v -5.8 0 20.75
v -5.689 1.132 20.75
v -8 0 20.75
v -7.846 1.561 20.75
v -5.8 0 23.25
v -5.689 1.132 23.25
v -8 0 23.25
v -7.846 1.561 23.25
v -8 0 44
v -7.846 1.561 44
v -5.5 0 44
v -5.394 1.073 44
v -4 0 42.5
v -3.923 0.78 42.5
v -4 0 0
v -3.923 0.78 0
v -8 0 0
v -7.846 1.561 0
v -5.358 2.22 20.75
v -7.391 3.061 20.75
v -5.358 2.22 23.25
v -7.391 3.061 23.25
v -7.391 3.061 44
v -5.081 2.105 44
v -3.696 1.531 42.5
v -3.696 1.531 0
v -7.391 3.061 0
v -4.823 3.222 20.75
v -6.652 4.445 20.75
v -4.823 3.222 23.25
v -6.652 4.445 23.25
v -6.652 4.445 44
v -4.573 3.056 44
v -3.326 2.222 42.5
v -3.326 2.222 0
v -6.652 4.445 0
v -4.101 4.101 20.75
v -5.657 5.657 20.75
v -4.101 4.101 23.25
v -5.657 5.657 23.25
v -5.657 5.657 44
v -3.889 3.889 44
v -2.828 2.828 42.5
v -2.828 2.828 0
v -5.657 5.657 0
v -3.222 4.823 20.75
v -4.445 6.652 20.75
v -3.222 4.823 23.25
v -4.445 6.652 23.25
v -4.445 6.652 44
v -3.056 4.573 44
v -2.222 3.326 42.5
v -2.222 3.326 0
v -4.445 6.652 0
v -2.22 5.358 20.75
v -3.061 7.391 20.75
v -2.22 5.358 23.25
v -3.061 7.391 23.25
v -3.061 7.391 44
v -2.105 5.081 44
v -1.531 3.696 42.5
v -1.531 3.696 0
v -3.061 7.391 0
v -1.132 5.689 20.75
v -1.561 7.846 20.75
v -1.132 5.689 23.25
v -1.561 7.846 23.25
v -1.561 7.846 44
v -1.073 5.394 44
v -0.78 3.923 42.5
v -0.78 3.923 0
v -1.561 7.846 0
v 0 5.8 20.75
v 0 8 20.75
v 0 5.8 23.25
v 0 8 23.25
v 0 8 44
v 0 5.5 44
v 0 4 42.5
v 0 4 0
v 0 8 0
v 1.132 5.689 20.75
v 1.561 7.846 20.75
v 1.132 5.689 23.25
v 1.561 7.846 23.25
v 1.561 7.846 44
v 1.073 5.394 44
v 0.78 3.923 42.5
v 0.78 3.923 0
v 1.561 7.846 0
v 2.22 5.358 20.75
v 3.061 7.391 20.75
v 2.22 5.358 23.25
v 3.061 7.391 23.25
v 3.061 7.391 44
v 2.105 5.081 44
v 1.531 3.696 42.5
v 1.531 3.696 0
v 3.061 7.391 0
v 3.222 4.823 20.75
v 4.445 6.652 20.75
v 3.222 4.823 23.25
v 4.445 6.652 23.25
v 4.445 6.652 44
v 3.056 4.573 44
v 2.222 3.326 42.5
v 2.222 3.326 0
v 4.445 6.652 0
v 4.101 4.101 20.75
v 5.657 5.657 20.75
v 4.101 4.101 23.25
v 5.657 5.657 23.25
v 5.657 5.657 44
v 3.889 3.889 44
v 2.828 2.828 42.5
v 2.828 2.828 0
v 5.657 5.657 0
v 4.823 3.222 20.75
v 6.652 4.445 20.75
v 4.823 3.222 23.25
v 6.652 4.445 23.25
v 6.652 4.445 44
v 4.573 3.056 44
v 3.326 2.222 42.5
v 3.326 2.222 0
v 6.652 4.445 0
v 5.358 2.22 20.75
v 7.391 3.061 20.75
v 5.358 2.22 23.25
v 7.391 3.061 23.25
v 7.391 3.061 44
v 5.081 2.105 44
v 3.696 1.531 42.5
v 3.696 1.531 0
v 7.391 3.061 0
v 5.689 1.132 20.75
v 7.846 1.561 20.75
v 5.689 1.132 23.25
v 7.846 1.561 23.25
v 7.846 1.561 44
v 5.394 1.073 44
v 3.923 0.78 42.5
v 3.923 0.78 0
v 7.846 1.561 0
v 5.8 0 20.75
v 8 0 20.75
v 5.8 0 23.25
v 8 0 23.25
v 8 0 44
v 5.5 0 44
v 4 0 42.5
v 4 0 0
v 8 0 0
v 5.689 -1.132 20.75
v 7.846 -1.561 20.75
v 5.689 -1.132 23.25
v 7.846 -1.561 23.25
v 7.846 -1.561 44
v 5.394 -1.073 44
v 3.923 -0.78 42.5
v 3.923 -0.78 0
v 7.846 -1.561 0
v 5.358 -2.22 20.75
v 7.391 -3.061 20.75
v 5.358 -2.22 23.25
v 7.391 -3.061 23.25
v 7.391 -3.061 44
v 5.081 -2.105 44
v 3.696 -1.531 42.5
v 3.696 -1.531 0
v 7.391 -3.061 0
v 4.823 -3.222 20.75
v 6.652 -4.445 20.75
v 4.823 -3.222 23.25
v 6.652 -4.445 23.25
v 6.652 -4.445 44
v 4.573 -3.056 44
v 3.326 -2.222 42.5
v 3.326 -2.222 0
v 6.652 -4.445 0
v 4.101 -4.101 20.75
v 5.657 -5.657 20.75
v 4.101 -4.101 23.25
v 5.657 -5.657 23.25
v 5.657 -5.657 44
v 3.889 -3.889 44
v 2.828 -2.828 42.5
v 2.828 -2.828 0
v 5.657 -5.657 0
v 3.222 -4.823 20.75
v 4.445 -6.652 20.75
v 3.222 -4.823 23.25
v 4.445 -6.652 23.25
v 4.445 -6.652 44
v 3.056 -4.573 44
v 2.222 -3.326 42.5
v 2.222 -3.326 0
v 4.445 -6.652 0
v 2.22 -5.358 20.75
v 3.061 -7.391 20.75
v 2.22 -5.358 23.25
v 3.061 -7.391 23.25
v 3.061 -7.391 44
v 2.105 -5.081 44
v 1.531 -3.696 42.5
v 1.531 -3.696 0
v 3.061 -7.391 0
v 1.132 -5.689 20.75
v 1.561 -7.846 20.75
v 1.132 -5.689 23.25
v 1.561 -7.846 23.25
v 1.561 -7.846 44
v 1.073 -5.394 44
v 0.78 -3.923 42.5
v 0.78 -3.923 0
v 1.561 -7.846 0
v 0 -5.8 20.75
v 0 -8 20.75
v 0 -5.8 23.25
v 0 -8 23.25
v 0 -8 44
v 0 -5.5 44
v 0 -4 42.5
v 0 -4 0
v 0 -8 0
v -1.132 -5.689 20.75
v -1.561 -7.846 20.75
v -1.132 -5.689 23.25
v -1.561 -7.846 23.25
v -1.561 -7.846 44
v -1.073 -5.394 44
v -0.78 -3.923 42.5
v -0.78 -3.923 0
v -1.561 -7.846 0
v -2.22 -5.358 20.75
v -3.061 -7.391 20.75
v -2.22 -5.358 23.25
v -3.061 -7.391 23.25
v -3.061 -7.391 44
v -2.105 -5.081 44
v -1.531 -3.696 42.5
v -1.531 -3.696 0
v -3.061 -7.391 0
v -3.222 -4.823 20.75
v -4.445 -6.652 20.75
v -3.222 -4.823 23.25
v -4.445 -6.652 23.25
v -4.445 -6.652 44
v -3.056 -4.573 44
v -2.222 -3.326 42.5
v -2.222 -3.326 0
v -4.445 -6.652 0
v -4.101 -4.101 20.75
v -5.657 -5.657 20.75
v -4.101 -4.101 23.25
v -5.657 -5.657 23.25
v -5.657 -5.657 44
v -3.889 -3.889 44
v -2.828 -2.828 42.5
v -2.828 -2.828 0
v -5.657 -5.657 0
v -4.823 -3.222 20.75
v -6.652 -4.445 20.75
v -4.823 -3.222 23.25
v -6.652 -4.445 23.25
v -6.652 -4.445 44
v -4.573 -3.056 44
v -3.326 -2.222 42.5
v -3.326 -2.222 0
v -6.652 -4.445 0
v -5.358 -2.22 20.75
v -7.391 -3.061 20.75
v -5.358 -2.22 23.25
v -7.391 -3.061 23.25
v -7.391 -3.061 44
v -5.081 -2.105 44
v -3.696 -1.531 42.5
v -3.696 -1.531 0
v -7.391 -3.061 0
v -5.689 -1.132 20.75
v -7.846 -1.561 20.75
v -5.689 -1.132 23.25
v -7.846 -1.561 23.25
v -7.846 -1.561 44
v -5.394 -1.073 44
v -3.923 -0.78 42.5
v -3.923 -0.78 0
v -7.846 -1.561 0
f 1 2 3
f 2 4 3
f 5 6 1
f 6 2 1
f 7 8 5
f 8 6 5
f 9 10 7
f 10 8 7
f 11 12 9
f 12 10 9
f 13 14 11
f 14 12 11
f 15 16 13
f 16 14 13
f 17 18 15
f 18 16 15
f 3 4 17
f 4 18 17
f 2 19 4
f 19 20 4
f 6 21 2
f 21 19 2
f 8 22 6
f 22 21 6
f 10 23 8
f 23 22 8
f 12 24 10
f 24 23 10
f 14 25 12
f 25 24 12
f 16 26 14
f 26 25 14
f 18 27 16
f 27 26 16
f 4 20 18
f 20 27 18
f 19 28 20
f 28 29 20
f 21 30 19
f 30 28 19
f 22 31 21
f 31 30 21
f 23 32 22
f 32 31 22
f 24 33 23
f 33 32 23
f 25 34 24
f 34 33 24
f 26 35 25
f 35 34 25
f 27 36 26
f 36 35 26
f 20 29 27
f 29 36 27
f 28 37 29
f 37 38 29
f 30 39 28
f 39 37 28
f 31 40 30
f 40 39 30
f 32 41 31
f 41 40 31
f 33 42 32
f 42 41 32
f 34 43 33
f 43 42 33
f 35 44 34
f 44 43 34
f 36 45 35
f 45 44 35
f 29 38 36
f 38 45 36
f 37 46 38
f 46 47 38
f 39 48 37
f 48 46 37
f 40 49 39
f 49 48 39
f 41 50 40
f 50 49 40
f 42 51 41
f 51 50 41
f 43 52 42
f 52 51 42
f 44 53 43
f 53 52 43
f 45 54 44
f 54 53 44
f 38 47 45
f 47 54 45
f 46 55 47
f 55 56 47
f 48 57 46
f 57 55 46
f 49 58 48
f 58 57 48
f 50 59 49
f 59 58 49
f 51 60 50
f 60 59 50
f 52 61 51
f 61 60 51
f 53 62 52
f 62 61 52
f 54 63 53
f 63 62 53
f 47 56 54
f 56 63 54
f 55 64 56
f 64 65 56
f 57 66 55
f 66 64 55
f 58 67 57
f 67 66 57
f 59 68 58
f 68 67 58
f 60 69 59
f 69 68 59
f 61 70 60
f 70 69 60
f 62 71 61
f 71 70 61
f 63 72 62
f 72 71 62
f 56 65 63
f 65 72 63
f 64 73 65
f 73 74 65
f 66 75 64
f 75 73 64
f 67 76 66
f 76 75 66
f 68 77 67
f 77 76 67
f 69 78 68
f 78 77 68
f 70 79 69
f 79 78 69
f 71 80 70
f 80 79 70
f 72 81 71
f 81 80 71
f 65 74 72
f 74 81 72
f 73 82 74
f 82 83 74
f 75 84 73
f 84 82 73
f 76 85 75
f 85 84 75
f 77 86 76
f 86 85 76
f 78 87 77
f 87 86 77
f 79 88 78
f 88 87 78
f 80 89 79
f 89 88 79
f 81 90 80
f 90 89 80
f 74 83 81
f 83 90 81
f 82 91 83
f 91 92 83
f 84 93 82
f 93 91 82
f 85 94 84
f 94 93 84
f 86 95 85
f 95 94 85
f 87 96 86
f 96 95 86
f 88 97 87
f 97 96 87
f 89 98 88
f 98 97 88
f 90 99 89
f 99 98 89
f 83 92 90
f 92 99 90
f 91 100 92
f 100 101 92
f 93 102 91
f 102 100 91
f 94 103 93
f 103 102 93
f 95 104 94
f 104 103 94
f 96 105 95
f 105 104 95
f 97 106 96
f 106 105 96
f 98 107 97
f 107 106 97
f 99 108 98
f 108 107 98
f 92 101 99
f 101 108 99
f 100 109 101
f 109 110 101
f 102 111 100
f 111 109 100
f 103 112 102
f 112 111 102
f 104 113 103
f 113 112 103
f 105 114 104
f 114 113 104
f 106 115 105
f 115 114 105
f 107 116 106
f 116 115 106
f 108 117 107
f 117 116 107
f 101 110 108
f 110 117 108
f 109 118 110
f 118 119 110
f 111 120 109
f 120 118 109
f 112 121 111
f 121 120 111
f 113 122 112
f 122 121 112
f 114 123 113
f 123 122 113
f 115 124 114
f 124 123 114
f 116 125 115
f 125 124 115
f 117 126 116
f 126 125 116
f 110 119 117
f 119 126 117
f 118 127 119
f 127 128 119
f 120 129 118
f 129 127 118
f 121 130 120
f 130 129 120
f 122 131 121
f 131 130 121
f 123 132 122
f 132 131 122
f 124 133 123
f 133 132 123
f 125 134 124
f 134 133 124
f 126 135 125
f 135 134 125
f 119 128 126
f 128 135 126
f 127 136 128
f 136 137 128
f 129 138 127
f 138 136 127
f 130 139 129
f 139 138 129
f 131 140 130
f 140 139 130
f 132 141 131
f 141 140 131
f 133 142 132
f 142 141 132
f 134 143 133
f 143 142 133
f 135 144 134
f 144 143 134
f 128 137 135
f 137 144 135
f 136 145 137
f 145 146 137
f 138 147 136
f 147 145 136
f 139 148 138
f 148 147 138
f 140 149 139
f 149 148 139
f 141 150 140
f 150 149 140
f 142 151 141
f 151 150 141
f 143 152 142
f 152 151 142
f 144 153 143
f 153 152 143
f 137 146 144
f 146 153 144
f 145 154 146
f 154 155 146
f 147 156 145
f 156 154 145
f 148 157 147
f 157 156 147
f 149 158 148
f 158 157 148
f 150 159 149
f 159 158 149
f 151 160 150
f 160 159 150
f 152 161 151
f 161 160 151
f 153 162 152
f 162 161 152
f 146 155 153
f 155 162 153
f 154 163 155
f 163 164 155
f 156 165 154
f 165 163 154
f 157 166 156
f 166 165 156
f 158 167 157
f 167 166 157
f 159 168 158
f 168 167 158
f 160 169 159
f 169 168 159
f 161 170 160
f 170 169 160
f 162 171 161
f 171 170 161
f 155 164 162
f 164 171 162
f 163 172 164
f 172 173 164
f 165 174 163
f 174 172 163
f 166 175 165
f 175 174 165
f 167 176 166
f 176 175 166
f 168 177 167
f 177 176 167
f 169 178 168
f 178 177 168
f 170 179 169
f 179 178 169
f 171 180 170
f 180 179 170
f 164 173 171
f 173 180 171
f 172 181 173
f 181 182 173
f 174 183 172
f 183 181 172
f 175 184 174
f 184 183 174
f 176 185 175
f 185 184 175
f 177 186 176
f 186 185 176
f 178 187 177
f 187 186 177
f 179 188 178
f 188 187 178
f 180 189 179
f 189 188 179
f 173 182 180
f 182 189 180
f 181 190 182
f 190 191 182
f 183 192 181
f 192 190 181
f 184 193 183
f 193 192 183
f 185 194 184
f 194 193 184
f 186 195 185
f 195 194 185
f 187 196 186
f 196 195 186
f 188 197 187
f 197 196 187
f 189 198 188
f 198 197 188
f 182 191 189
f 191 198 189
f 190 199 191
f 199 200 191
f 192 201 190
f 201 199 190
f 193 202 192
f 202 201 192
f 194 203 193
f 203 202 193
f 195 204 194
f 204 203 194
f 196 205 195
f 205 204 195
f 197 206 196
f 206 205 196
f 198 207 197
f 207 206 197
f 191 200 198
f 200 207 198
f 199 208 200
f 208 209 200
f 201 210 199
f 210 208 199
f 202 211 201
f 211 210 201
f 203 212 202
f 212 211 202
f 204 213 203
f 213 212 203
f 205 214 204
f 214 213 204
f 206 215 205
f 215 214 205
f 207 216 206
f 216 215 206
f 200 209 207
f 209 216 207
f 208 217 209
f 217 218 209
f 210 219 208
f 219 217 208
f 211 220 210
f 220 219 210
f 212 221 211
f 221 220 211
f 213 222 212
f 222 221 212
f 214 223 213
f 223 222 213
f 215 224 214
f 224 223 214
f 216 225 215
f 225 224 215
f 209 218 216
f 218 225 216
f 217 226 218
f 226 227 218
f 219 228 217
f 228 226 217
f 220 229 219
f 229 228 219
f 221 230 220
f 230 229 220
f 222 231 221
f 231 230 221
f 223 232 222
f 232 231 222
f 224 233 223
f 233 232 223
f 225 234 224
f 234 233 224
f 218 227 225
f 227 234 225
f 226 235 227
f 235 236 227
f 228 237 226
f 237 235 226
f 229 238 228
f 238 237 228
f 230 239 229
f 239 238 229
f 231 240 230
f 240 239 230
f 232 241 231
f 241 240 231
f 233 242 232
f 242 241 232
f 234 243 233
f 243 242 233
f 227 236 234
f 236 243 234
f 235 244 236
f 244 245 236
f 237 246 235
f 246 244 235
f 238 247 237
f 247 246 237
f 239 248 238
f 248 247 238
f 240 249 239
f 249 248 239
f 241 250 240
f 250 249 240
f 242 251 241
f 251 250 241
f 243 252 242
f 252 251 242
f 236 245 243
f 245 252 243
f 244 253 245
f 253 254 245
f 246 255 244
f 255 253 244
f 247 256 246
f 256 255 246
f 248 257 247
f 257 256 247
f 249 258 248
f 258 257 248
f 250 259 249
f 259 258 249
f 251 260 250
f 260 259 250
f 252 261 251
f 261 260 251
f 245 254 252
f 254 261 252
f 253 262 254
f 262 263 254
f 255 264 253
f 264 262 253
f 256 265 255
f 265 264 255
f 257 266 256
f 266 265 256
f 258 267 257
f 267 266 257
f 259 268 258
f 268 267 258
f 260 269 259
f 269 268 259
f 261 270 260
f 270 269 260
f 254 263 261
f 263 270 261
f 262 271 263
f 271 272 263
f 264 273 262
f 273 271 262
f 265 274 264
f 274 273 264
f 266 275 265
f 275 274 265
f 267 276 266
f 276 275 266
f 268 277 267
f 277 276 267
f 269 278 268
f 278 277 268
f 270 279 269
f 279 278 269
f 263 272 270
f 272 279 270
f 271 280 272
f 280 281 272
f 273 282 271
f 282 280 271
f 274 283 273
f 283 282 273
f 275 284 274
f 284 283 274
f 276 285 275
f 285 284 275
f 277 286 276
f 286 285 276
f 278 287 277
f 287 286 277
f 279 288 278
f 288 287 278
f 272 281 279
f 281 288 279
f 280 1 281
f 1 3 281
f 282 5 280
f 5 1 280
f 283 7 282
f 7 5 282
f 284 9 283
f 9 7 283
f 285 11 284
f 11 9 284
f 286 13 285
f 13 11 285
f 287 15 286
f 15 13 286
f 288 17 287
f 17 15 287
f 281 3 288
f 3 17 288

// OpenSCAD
$fn = 32;

// ----------------------------------------------------------------------
// Grooved revolve: thread_relief, bore R4
// ----------------------------------------------------------------------

// --- parameters (mm) ---
bore_r = 4;               // bore radius
outer_r = 8;              // outer radius of the body
total_h = 44;             // overall height, Z
wall = 4;                 // radial wall thickness
groove_w = 2.5;           // groove width
groove_d = 2.2;           // groove depth
grooves = 1;              // number of outer grooves
relief = 1.5;             // thread relief leg at the bore mouth
relief_angle = 45;        // thread relief chamfer angle, degrees
fit_tol = 0.05;           // declared fit tolerance (prompt contract)
free_tol = 0.2;           // declared free tolerance (prompt contract)

bbox_x = 2 * outer_r;  // full diameter
bore_d = 2 * bore_r;  // bore diameter
body_d = 2 * outer_r;  // body diameter
revolve_angle = 360;  // full turn around the Z axis

profile = [[4, 0], [8, 0], [8, 20.75], [5.8, 20.75], [5.8, 23.25], [8, 23.25], [8, 44], [5.5, 44], [4, 42.5]];  // primary outline, 9 points, counter clockwise

// --- the one profile operation ---
rotate_extrude(angle = revolve_angle) polygon(points = profile);
